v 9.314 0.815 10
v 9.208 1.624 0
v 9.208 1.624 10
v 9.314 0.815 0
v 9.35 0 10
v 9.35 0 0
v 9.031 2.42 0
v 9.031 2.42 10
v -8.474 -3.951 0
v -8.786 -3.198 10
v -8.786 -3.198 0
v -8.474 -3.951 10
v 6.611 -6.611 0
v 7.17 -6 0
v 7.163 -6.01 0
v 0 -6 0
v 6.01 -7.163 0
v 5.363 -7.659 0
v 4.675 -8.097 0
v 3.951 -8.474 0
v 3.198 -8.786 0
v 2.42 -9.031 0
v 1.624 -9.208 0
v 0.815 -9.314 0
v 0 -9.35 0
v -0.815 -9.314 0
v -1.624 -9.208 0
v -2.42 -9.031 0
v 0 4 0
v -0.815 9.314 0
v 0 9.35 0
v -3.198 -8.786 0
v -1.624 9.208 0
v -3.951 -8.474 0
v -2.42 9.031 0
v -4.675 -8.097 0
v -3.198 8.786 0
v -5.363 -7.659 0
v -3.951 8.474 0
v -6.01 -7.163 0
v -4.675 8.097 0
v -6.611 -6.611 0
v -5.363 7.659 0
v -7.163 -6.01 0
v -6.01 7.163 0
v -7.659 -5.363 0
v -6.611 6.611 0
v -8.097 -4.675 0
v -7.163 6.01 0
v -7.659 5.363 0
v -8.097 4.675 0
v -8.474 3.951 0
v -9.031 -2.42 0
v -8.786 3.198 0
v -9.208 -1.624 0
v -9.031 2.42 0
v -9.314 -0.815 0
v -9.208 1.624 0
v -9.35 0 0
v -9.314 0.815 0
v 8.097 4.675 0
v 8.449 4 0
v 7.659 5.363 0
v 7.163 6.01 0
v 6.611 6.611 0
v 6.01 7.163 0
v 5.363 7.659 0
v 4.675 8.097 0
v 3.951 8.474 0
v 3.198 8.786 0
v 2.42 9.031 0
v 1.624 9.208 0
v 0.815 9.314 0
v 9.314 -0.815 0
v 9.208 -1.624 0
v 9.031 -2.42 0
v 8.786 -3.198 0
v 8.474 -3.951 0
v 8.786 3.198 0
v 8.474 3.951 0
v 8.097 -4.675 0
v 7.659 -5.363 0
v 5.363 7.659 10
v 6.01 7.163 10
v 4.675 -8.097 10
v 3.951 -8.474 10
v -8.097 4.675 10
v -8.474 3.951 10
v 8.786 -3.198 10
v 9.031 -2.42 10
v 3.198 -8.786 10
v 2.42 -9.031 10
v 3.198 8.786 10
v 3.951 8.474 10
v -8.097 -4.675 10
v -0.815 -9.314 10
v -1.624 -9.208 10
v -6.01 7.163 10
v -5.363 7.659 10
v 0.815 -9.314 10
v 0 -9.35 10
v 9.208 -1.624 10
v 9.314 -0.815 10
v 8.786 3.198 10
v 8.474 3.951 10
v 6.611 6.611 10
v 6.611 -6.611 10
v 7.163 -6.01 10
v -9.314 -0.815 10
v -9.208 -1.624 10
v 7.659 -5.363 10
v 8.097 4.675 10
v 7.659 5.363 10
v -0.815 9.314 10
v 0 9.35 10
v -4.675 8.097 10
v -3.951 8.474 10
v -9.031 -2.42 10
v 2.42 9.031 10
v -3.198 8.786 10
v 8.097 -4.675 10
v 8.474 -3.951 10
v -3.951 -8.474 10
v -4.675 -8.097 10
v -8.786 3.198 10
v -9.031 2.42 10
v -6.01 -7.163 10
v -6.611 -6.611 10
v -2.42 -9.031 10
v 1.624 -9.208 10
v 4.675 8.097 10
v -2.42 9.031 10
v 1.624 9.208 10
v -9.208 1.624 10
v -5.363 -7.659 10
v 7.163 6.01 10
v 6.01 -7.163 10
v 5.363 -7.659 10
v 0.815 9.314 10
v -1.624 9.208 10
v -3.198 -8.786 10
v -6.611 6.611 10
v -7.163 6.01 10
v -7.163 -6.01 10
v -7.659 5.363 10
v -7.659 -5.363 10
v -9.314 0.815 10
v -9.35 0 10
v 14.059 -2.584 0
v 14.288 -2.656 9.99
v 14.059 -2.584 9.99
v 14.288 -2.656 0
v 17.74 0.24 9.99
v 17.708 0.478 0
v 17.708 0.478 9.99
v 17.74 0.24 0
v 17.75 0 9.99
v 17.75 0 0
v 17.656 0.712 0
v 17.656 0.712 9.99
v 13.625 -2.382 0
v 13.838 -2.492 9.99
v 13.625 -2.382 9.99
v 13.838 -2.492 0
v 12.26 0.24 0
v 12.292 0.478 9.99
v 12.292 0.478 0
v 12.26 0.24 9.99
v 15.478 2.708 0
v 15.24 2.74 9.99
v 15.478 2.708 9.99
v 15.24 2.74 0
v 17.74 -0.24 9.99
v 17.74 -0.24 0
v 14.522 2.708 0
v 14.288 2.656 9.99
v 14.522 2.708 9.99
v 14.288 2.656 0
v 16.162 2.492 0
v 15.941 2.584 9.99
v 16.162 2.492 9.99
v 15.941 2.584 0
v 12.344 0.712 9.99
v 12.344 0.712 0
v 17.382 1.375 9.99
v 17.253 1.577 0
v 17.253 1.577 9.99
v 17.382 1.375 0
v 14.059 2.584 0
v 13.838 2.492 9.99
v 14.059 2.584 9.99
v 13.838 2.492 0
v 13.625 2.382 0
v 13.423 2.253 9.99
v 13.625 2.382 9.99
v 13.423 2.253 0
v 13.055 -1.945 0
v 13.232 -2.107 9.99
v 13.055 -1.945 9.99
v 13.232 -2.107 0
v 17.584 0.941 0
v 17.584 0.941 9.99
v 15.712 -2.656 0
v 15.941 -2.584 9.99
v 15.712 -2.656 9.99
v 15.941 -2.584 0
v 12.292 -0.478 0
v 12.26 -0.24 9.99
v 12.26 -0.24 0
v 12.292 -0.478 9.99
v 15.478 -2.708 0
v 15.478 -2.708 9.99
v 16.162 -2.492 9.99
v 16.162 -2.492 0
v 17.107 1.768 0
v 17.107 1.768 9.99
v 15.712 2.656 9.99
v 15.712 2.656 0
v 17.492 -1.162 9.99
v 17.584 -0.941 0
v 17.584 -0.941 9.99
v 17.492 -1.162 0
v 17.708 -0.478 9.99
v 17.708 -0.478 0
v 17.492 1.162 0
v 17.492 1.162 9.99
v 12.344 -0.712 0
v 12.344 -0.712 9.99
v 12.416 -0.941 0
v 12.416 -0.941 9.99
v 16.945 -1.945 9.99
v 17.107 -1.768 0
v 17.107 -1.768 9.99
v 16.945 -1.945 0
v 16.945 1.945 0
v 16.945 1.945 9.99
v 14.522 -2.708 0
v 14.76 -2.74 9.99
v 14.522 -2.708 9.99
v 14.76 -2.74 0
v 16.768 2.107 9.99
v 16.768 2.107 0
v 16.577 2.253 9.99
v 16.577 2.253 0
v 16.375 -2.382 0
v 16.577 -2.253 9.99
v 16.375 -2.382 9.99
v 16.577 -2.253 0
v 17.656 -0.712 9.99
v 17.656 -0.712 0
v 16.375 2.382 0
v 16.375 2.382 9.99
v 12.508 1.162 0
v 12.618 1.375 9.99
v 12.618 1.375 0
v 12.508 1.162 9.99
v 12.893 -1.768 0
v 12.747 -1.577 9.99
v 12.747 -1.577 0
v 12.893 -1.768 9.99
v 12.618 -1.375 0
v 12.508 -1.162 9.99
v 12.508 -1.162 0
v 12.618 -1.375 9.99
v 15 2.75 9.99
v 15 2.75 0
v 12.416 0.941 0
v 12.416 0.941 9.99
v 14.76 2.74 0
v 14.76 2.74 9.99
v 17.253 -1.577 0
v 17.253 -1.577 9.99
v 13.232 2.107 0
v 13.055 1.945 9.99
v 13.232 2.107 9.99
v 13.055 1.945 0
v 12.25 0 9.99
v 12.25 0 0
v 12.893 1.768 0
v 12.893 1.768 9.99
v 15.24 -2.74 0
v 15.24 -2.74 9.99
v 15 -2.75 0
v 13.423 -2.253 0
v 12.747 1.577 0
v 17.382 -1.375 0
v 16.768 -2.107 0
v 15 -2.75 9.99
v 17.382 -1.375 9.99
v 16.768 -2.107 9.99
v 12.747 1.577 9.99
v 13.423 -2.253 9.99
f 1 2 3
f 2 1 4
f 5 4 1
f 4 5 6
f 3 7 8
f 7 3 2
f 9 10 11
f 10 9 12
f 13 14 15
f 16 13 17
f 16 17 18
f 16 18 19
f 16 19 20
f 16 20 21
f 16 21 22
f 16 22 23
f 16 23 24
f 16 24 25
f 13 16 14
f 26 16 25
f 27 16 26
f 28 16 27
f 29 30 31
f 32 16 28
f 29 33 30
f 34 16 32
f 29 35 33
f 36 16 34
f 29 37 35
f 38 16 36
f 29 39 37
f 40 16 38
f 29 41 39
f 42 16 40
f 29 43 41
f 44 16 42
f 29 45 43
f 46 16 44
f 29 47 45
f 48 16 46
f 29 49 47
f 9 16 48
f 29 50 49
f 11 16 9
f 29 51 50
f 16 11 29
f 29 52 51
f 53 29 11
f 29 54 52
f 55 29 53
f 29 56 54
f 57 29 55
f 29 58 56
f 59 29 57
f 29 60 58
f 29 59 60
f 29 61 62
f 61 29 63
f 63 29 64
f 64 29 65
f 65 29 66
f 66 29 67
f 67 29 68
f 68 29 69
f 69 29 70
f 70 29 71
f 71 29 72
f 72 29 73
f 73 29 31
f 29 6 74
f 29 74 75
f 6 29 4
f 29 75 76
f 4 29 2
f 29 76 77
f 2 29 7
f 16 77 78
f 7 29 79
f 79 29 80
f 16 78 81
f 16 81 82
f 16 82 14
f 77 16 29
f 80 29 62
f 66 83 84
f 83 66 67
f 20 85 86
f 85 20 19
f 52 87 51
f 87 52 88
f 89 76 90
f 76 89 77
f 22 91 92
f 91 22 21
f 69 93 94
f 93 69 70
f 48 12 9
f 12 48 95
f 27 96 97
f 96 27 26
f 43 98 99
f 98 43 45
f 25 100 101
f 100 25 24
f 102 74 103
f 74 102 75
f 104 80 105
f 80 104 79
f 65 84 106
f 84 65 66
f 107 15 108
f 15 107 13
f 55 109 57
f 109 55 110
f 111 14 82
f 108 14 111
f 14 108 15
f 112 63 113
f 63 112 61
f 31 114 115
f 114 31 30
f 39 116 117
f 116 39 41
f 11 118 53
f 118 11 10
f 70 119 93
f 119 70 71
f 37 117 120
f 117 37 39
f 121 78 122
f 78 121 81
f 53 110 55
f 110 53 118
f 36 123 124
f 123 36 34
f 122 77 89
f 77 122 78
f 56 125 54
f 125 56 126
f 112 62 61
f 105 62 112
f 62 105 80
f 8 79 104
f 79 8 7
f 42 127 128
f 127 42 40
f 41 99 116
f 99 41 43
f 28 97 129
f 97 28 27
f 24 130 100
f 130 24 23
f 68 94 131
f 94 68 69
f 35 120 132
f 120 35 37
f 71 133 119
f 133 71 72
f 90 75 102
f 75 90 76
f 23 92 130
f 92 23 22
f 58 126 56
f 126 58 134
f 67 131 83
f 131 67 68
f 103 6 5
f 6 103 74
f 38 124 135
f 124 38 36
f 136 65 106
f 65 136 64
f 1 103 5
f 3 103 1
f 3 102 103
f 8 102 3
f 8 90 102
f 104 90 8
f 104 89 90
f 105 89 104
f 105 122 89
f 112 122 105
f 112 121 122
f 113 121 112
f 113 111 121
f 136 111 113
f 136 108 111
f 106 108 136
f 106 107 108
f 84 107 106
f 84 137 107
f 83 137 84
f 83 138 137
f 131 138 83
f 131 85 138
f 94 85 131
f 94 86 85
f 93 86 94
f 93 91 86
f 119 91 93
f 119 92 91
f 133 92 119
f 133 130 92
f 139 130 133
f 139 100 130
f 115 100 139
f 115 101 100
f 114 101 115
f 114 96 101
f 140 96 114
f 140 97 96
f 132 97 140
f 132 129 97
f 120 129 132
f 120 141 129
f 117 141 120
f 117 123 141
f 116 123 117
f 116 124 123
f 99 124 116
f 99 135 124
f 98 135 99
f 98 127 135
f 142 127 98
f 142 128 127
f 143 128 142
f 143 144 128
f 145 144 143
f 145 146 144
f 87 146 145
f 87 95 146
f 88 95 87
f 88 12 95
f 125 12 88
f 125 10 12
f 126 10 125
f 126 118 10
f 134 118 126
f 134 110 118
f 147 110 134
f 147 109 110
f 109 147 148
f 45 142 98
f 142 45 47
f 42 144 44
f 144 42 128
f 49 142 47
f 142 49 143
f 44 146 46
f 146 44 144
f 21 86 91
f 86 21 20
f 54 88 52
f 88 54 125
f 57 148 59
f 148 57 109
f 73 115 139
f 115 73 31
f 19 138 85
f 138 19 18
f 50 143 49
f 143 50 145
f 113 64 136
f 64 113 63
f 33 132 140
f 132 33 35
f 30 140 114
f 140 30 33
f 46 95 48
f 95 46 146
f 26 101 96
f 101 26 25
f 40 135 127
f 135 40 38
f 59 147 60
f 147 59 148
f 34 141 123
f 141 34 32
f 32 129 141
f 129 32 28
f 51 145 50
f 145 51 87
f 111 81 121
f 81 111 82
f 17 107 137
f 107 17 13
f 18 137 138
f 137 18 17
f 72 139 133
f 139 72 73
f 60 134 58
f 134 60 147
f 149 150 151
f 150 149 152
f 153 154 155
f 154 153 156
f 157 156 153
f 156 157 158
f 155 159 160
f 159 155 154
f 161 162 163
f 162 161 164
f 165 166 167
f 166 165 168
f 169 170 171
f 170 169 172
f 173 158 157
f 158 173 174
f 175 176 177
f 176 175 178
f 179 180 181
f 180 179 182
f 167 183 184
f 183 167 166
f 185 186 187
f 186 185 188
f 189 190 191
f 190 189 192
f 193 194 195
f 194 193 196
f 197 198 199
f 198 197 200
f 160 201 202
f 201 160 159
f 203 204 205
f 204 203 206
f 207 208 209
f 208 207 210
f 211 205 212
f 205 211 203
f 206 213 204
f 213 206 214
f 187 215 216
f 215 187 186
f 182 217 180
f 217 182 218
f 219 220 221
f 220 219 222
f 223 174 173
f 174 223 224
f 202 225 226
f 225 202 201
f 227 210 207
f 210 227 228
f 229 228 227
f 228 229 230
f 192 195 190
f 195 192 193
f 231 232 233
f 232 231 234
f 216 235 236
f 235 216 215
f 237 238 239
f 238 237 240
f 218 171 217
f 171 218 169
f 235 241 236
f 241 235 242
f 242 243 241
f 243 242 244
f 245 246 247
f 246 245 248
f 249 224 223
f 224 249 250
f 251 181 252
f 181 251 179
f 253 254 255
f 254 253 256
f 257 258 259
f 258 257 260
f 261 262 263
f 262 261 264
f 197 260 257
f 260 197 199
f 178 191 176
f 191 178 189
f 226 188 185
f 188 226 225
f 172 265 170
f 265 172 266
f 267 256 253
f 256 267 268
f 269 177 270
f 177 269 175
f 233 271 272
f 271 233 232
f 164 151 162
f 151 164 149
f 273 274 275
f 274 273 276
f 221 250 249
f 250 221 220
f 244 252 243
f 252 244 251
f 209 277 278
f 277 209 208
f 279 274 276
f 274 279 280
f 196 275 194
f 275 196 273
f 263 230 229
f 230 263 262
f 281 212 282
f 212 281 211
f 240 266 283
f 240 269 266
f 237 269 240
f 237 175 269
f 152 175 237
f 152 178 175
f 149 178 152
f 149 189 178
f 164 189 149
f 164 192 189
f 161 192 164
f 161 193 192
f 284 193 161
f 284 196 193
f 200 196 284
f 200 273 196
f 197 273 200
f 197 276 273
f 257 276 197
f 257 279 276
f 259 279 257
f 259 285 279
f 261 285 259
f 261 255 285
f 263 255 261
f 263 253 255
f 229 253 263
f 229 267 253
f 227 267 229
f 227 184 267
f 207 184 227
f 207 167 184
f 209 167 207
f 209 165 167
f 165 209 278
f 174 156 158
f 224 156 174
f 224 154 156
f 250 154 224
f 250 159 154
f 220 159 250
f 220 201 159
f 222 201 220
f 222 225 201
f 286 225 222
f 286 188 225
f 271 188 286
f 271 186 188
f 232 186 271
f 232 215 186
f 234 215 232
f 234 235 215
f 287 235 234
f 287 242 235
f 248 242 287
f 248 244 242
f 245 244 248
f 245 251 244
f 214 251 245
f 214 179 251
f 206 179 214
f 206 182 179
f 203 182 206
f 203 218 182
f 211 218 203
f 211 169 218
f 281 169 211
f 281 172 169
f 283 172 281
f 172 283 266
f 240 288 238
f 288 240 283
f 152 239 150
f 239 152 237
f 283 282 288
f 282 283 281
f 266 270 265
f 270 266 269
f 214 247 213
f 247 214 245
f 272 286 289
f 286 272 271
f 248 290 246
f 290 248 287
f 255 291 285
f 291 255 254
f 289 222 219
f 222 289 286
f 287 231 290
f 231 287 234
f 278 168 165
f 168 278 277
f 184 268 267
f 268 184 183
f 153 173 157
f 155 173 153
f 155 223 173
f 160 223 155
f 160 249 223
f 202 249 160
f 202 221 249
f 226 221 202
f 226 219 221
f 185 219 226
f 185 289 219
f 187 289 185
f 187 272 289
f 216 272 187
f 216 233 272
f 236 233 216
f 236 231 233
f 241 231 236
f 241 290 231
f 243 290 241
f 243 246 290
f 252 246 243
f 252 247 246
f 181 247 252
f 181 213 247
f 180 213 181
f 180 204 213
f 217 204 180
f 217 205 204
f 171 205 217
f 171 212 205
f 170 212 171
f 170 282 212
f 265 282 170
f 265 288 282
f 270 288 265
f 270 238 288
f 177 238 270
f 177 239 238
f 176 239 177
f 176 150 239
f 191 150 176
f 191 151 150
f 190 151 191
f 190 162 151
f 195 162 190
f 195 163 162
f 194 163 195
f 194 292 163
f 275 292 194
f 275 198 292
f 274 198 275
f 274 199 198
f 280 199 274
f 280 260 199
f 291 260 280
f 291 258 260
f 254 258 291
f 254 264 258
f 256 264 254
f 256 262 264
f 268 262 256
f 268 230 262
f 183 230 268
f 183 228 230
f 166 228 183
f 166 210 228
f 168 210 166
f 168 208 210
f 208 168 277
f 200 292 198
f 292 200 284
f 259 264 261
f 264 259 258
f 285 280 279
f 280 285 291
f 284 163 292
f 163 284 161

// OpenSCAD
// Stand rod and tubing clip - a part that snaps onto a round stand rod (e.g. a bench mat
// stand or shelf pole) and holds a piece of round tubing next to it. NOVEL general part.
//

stand_d  = 12.7;
tubing_d = 6;
height   = 10;

$fn = 72;

ring_d = stand_d + 2 * 3;          // outer diameter of the stand ring
open   = 10;                       // opening in the stand ring, so it snaps onto the rod

bridge_w = 6;
t        = min(2, height - 1);      // keep a wall above the lowest slot

difference() {
    union() {
        cylinder(h = height, d = ring_d);                 // stand ring (outer)
        cylinder(h = height - 0.01, d = stand_d + 2 * 3 - open);   // stand ring (inner)
        cylinder(h = height, d = tubing_d + 2 * 2);                 // tubing ring (outer)
        translate([15, 0, 0]) cylinder(h = height - 0.01, d = tubing_d + 2 * 2 - 4.5);   // tubing ring (inner)
        translate([-bridge_w / 2, -t / 2, 0]) cube([bridge_w, t, height]);                 // bridge
    }
    translate([0, -open / 2 - 1, 0]) rotate([-90, 0, 0]) cube([open + 2, t + 2, height]);           // stand ring opening
    translate([15, -4.5 / 2 - 1, 0]) rotate([-90, 0, 0]) cube([4.5 + 2, t + 2, height]);           // tubing ring opening
}
